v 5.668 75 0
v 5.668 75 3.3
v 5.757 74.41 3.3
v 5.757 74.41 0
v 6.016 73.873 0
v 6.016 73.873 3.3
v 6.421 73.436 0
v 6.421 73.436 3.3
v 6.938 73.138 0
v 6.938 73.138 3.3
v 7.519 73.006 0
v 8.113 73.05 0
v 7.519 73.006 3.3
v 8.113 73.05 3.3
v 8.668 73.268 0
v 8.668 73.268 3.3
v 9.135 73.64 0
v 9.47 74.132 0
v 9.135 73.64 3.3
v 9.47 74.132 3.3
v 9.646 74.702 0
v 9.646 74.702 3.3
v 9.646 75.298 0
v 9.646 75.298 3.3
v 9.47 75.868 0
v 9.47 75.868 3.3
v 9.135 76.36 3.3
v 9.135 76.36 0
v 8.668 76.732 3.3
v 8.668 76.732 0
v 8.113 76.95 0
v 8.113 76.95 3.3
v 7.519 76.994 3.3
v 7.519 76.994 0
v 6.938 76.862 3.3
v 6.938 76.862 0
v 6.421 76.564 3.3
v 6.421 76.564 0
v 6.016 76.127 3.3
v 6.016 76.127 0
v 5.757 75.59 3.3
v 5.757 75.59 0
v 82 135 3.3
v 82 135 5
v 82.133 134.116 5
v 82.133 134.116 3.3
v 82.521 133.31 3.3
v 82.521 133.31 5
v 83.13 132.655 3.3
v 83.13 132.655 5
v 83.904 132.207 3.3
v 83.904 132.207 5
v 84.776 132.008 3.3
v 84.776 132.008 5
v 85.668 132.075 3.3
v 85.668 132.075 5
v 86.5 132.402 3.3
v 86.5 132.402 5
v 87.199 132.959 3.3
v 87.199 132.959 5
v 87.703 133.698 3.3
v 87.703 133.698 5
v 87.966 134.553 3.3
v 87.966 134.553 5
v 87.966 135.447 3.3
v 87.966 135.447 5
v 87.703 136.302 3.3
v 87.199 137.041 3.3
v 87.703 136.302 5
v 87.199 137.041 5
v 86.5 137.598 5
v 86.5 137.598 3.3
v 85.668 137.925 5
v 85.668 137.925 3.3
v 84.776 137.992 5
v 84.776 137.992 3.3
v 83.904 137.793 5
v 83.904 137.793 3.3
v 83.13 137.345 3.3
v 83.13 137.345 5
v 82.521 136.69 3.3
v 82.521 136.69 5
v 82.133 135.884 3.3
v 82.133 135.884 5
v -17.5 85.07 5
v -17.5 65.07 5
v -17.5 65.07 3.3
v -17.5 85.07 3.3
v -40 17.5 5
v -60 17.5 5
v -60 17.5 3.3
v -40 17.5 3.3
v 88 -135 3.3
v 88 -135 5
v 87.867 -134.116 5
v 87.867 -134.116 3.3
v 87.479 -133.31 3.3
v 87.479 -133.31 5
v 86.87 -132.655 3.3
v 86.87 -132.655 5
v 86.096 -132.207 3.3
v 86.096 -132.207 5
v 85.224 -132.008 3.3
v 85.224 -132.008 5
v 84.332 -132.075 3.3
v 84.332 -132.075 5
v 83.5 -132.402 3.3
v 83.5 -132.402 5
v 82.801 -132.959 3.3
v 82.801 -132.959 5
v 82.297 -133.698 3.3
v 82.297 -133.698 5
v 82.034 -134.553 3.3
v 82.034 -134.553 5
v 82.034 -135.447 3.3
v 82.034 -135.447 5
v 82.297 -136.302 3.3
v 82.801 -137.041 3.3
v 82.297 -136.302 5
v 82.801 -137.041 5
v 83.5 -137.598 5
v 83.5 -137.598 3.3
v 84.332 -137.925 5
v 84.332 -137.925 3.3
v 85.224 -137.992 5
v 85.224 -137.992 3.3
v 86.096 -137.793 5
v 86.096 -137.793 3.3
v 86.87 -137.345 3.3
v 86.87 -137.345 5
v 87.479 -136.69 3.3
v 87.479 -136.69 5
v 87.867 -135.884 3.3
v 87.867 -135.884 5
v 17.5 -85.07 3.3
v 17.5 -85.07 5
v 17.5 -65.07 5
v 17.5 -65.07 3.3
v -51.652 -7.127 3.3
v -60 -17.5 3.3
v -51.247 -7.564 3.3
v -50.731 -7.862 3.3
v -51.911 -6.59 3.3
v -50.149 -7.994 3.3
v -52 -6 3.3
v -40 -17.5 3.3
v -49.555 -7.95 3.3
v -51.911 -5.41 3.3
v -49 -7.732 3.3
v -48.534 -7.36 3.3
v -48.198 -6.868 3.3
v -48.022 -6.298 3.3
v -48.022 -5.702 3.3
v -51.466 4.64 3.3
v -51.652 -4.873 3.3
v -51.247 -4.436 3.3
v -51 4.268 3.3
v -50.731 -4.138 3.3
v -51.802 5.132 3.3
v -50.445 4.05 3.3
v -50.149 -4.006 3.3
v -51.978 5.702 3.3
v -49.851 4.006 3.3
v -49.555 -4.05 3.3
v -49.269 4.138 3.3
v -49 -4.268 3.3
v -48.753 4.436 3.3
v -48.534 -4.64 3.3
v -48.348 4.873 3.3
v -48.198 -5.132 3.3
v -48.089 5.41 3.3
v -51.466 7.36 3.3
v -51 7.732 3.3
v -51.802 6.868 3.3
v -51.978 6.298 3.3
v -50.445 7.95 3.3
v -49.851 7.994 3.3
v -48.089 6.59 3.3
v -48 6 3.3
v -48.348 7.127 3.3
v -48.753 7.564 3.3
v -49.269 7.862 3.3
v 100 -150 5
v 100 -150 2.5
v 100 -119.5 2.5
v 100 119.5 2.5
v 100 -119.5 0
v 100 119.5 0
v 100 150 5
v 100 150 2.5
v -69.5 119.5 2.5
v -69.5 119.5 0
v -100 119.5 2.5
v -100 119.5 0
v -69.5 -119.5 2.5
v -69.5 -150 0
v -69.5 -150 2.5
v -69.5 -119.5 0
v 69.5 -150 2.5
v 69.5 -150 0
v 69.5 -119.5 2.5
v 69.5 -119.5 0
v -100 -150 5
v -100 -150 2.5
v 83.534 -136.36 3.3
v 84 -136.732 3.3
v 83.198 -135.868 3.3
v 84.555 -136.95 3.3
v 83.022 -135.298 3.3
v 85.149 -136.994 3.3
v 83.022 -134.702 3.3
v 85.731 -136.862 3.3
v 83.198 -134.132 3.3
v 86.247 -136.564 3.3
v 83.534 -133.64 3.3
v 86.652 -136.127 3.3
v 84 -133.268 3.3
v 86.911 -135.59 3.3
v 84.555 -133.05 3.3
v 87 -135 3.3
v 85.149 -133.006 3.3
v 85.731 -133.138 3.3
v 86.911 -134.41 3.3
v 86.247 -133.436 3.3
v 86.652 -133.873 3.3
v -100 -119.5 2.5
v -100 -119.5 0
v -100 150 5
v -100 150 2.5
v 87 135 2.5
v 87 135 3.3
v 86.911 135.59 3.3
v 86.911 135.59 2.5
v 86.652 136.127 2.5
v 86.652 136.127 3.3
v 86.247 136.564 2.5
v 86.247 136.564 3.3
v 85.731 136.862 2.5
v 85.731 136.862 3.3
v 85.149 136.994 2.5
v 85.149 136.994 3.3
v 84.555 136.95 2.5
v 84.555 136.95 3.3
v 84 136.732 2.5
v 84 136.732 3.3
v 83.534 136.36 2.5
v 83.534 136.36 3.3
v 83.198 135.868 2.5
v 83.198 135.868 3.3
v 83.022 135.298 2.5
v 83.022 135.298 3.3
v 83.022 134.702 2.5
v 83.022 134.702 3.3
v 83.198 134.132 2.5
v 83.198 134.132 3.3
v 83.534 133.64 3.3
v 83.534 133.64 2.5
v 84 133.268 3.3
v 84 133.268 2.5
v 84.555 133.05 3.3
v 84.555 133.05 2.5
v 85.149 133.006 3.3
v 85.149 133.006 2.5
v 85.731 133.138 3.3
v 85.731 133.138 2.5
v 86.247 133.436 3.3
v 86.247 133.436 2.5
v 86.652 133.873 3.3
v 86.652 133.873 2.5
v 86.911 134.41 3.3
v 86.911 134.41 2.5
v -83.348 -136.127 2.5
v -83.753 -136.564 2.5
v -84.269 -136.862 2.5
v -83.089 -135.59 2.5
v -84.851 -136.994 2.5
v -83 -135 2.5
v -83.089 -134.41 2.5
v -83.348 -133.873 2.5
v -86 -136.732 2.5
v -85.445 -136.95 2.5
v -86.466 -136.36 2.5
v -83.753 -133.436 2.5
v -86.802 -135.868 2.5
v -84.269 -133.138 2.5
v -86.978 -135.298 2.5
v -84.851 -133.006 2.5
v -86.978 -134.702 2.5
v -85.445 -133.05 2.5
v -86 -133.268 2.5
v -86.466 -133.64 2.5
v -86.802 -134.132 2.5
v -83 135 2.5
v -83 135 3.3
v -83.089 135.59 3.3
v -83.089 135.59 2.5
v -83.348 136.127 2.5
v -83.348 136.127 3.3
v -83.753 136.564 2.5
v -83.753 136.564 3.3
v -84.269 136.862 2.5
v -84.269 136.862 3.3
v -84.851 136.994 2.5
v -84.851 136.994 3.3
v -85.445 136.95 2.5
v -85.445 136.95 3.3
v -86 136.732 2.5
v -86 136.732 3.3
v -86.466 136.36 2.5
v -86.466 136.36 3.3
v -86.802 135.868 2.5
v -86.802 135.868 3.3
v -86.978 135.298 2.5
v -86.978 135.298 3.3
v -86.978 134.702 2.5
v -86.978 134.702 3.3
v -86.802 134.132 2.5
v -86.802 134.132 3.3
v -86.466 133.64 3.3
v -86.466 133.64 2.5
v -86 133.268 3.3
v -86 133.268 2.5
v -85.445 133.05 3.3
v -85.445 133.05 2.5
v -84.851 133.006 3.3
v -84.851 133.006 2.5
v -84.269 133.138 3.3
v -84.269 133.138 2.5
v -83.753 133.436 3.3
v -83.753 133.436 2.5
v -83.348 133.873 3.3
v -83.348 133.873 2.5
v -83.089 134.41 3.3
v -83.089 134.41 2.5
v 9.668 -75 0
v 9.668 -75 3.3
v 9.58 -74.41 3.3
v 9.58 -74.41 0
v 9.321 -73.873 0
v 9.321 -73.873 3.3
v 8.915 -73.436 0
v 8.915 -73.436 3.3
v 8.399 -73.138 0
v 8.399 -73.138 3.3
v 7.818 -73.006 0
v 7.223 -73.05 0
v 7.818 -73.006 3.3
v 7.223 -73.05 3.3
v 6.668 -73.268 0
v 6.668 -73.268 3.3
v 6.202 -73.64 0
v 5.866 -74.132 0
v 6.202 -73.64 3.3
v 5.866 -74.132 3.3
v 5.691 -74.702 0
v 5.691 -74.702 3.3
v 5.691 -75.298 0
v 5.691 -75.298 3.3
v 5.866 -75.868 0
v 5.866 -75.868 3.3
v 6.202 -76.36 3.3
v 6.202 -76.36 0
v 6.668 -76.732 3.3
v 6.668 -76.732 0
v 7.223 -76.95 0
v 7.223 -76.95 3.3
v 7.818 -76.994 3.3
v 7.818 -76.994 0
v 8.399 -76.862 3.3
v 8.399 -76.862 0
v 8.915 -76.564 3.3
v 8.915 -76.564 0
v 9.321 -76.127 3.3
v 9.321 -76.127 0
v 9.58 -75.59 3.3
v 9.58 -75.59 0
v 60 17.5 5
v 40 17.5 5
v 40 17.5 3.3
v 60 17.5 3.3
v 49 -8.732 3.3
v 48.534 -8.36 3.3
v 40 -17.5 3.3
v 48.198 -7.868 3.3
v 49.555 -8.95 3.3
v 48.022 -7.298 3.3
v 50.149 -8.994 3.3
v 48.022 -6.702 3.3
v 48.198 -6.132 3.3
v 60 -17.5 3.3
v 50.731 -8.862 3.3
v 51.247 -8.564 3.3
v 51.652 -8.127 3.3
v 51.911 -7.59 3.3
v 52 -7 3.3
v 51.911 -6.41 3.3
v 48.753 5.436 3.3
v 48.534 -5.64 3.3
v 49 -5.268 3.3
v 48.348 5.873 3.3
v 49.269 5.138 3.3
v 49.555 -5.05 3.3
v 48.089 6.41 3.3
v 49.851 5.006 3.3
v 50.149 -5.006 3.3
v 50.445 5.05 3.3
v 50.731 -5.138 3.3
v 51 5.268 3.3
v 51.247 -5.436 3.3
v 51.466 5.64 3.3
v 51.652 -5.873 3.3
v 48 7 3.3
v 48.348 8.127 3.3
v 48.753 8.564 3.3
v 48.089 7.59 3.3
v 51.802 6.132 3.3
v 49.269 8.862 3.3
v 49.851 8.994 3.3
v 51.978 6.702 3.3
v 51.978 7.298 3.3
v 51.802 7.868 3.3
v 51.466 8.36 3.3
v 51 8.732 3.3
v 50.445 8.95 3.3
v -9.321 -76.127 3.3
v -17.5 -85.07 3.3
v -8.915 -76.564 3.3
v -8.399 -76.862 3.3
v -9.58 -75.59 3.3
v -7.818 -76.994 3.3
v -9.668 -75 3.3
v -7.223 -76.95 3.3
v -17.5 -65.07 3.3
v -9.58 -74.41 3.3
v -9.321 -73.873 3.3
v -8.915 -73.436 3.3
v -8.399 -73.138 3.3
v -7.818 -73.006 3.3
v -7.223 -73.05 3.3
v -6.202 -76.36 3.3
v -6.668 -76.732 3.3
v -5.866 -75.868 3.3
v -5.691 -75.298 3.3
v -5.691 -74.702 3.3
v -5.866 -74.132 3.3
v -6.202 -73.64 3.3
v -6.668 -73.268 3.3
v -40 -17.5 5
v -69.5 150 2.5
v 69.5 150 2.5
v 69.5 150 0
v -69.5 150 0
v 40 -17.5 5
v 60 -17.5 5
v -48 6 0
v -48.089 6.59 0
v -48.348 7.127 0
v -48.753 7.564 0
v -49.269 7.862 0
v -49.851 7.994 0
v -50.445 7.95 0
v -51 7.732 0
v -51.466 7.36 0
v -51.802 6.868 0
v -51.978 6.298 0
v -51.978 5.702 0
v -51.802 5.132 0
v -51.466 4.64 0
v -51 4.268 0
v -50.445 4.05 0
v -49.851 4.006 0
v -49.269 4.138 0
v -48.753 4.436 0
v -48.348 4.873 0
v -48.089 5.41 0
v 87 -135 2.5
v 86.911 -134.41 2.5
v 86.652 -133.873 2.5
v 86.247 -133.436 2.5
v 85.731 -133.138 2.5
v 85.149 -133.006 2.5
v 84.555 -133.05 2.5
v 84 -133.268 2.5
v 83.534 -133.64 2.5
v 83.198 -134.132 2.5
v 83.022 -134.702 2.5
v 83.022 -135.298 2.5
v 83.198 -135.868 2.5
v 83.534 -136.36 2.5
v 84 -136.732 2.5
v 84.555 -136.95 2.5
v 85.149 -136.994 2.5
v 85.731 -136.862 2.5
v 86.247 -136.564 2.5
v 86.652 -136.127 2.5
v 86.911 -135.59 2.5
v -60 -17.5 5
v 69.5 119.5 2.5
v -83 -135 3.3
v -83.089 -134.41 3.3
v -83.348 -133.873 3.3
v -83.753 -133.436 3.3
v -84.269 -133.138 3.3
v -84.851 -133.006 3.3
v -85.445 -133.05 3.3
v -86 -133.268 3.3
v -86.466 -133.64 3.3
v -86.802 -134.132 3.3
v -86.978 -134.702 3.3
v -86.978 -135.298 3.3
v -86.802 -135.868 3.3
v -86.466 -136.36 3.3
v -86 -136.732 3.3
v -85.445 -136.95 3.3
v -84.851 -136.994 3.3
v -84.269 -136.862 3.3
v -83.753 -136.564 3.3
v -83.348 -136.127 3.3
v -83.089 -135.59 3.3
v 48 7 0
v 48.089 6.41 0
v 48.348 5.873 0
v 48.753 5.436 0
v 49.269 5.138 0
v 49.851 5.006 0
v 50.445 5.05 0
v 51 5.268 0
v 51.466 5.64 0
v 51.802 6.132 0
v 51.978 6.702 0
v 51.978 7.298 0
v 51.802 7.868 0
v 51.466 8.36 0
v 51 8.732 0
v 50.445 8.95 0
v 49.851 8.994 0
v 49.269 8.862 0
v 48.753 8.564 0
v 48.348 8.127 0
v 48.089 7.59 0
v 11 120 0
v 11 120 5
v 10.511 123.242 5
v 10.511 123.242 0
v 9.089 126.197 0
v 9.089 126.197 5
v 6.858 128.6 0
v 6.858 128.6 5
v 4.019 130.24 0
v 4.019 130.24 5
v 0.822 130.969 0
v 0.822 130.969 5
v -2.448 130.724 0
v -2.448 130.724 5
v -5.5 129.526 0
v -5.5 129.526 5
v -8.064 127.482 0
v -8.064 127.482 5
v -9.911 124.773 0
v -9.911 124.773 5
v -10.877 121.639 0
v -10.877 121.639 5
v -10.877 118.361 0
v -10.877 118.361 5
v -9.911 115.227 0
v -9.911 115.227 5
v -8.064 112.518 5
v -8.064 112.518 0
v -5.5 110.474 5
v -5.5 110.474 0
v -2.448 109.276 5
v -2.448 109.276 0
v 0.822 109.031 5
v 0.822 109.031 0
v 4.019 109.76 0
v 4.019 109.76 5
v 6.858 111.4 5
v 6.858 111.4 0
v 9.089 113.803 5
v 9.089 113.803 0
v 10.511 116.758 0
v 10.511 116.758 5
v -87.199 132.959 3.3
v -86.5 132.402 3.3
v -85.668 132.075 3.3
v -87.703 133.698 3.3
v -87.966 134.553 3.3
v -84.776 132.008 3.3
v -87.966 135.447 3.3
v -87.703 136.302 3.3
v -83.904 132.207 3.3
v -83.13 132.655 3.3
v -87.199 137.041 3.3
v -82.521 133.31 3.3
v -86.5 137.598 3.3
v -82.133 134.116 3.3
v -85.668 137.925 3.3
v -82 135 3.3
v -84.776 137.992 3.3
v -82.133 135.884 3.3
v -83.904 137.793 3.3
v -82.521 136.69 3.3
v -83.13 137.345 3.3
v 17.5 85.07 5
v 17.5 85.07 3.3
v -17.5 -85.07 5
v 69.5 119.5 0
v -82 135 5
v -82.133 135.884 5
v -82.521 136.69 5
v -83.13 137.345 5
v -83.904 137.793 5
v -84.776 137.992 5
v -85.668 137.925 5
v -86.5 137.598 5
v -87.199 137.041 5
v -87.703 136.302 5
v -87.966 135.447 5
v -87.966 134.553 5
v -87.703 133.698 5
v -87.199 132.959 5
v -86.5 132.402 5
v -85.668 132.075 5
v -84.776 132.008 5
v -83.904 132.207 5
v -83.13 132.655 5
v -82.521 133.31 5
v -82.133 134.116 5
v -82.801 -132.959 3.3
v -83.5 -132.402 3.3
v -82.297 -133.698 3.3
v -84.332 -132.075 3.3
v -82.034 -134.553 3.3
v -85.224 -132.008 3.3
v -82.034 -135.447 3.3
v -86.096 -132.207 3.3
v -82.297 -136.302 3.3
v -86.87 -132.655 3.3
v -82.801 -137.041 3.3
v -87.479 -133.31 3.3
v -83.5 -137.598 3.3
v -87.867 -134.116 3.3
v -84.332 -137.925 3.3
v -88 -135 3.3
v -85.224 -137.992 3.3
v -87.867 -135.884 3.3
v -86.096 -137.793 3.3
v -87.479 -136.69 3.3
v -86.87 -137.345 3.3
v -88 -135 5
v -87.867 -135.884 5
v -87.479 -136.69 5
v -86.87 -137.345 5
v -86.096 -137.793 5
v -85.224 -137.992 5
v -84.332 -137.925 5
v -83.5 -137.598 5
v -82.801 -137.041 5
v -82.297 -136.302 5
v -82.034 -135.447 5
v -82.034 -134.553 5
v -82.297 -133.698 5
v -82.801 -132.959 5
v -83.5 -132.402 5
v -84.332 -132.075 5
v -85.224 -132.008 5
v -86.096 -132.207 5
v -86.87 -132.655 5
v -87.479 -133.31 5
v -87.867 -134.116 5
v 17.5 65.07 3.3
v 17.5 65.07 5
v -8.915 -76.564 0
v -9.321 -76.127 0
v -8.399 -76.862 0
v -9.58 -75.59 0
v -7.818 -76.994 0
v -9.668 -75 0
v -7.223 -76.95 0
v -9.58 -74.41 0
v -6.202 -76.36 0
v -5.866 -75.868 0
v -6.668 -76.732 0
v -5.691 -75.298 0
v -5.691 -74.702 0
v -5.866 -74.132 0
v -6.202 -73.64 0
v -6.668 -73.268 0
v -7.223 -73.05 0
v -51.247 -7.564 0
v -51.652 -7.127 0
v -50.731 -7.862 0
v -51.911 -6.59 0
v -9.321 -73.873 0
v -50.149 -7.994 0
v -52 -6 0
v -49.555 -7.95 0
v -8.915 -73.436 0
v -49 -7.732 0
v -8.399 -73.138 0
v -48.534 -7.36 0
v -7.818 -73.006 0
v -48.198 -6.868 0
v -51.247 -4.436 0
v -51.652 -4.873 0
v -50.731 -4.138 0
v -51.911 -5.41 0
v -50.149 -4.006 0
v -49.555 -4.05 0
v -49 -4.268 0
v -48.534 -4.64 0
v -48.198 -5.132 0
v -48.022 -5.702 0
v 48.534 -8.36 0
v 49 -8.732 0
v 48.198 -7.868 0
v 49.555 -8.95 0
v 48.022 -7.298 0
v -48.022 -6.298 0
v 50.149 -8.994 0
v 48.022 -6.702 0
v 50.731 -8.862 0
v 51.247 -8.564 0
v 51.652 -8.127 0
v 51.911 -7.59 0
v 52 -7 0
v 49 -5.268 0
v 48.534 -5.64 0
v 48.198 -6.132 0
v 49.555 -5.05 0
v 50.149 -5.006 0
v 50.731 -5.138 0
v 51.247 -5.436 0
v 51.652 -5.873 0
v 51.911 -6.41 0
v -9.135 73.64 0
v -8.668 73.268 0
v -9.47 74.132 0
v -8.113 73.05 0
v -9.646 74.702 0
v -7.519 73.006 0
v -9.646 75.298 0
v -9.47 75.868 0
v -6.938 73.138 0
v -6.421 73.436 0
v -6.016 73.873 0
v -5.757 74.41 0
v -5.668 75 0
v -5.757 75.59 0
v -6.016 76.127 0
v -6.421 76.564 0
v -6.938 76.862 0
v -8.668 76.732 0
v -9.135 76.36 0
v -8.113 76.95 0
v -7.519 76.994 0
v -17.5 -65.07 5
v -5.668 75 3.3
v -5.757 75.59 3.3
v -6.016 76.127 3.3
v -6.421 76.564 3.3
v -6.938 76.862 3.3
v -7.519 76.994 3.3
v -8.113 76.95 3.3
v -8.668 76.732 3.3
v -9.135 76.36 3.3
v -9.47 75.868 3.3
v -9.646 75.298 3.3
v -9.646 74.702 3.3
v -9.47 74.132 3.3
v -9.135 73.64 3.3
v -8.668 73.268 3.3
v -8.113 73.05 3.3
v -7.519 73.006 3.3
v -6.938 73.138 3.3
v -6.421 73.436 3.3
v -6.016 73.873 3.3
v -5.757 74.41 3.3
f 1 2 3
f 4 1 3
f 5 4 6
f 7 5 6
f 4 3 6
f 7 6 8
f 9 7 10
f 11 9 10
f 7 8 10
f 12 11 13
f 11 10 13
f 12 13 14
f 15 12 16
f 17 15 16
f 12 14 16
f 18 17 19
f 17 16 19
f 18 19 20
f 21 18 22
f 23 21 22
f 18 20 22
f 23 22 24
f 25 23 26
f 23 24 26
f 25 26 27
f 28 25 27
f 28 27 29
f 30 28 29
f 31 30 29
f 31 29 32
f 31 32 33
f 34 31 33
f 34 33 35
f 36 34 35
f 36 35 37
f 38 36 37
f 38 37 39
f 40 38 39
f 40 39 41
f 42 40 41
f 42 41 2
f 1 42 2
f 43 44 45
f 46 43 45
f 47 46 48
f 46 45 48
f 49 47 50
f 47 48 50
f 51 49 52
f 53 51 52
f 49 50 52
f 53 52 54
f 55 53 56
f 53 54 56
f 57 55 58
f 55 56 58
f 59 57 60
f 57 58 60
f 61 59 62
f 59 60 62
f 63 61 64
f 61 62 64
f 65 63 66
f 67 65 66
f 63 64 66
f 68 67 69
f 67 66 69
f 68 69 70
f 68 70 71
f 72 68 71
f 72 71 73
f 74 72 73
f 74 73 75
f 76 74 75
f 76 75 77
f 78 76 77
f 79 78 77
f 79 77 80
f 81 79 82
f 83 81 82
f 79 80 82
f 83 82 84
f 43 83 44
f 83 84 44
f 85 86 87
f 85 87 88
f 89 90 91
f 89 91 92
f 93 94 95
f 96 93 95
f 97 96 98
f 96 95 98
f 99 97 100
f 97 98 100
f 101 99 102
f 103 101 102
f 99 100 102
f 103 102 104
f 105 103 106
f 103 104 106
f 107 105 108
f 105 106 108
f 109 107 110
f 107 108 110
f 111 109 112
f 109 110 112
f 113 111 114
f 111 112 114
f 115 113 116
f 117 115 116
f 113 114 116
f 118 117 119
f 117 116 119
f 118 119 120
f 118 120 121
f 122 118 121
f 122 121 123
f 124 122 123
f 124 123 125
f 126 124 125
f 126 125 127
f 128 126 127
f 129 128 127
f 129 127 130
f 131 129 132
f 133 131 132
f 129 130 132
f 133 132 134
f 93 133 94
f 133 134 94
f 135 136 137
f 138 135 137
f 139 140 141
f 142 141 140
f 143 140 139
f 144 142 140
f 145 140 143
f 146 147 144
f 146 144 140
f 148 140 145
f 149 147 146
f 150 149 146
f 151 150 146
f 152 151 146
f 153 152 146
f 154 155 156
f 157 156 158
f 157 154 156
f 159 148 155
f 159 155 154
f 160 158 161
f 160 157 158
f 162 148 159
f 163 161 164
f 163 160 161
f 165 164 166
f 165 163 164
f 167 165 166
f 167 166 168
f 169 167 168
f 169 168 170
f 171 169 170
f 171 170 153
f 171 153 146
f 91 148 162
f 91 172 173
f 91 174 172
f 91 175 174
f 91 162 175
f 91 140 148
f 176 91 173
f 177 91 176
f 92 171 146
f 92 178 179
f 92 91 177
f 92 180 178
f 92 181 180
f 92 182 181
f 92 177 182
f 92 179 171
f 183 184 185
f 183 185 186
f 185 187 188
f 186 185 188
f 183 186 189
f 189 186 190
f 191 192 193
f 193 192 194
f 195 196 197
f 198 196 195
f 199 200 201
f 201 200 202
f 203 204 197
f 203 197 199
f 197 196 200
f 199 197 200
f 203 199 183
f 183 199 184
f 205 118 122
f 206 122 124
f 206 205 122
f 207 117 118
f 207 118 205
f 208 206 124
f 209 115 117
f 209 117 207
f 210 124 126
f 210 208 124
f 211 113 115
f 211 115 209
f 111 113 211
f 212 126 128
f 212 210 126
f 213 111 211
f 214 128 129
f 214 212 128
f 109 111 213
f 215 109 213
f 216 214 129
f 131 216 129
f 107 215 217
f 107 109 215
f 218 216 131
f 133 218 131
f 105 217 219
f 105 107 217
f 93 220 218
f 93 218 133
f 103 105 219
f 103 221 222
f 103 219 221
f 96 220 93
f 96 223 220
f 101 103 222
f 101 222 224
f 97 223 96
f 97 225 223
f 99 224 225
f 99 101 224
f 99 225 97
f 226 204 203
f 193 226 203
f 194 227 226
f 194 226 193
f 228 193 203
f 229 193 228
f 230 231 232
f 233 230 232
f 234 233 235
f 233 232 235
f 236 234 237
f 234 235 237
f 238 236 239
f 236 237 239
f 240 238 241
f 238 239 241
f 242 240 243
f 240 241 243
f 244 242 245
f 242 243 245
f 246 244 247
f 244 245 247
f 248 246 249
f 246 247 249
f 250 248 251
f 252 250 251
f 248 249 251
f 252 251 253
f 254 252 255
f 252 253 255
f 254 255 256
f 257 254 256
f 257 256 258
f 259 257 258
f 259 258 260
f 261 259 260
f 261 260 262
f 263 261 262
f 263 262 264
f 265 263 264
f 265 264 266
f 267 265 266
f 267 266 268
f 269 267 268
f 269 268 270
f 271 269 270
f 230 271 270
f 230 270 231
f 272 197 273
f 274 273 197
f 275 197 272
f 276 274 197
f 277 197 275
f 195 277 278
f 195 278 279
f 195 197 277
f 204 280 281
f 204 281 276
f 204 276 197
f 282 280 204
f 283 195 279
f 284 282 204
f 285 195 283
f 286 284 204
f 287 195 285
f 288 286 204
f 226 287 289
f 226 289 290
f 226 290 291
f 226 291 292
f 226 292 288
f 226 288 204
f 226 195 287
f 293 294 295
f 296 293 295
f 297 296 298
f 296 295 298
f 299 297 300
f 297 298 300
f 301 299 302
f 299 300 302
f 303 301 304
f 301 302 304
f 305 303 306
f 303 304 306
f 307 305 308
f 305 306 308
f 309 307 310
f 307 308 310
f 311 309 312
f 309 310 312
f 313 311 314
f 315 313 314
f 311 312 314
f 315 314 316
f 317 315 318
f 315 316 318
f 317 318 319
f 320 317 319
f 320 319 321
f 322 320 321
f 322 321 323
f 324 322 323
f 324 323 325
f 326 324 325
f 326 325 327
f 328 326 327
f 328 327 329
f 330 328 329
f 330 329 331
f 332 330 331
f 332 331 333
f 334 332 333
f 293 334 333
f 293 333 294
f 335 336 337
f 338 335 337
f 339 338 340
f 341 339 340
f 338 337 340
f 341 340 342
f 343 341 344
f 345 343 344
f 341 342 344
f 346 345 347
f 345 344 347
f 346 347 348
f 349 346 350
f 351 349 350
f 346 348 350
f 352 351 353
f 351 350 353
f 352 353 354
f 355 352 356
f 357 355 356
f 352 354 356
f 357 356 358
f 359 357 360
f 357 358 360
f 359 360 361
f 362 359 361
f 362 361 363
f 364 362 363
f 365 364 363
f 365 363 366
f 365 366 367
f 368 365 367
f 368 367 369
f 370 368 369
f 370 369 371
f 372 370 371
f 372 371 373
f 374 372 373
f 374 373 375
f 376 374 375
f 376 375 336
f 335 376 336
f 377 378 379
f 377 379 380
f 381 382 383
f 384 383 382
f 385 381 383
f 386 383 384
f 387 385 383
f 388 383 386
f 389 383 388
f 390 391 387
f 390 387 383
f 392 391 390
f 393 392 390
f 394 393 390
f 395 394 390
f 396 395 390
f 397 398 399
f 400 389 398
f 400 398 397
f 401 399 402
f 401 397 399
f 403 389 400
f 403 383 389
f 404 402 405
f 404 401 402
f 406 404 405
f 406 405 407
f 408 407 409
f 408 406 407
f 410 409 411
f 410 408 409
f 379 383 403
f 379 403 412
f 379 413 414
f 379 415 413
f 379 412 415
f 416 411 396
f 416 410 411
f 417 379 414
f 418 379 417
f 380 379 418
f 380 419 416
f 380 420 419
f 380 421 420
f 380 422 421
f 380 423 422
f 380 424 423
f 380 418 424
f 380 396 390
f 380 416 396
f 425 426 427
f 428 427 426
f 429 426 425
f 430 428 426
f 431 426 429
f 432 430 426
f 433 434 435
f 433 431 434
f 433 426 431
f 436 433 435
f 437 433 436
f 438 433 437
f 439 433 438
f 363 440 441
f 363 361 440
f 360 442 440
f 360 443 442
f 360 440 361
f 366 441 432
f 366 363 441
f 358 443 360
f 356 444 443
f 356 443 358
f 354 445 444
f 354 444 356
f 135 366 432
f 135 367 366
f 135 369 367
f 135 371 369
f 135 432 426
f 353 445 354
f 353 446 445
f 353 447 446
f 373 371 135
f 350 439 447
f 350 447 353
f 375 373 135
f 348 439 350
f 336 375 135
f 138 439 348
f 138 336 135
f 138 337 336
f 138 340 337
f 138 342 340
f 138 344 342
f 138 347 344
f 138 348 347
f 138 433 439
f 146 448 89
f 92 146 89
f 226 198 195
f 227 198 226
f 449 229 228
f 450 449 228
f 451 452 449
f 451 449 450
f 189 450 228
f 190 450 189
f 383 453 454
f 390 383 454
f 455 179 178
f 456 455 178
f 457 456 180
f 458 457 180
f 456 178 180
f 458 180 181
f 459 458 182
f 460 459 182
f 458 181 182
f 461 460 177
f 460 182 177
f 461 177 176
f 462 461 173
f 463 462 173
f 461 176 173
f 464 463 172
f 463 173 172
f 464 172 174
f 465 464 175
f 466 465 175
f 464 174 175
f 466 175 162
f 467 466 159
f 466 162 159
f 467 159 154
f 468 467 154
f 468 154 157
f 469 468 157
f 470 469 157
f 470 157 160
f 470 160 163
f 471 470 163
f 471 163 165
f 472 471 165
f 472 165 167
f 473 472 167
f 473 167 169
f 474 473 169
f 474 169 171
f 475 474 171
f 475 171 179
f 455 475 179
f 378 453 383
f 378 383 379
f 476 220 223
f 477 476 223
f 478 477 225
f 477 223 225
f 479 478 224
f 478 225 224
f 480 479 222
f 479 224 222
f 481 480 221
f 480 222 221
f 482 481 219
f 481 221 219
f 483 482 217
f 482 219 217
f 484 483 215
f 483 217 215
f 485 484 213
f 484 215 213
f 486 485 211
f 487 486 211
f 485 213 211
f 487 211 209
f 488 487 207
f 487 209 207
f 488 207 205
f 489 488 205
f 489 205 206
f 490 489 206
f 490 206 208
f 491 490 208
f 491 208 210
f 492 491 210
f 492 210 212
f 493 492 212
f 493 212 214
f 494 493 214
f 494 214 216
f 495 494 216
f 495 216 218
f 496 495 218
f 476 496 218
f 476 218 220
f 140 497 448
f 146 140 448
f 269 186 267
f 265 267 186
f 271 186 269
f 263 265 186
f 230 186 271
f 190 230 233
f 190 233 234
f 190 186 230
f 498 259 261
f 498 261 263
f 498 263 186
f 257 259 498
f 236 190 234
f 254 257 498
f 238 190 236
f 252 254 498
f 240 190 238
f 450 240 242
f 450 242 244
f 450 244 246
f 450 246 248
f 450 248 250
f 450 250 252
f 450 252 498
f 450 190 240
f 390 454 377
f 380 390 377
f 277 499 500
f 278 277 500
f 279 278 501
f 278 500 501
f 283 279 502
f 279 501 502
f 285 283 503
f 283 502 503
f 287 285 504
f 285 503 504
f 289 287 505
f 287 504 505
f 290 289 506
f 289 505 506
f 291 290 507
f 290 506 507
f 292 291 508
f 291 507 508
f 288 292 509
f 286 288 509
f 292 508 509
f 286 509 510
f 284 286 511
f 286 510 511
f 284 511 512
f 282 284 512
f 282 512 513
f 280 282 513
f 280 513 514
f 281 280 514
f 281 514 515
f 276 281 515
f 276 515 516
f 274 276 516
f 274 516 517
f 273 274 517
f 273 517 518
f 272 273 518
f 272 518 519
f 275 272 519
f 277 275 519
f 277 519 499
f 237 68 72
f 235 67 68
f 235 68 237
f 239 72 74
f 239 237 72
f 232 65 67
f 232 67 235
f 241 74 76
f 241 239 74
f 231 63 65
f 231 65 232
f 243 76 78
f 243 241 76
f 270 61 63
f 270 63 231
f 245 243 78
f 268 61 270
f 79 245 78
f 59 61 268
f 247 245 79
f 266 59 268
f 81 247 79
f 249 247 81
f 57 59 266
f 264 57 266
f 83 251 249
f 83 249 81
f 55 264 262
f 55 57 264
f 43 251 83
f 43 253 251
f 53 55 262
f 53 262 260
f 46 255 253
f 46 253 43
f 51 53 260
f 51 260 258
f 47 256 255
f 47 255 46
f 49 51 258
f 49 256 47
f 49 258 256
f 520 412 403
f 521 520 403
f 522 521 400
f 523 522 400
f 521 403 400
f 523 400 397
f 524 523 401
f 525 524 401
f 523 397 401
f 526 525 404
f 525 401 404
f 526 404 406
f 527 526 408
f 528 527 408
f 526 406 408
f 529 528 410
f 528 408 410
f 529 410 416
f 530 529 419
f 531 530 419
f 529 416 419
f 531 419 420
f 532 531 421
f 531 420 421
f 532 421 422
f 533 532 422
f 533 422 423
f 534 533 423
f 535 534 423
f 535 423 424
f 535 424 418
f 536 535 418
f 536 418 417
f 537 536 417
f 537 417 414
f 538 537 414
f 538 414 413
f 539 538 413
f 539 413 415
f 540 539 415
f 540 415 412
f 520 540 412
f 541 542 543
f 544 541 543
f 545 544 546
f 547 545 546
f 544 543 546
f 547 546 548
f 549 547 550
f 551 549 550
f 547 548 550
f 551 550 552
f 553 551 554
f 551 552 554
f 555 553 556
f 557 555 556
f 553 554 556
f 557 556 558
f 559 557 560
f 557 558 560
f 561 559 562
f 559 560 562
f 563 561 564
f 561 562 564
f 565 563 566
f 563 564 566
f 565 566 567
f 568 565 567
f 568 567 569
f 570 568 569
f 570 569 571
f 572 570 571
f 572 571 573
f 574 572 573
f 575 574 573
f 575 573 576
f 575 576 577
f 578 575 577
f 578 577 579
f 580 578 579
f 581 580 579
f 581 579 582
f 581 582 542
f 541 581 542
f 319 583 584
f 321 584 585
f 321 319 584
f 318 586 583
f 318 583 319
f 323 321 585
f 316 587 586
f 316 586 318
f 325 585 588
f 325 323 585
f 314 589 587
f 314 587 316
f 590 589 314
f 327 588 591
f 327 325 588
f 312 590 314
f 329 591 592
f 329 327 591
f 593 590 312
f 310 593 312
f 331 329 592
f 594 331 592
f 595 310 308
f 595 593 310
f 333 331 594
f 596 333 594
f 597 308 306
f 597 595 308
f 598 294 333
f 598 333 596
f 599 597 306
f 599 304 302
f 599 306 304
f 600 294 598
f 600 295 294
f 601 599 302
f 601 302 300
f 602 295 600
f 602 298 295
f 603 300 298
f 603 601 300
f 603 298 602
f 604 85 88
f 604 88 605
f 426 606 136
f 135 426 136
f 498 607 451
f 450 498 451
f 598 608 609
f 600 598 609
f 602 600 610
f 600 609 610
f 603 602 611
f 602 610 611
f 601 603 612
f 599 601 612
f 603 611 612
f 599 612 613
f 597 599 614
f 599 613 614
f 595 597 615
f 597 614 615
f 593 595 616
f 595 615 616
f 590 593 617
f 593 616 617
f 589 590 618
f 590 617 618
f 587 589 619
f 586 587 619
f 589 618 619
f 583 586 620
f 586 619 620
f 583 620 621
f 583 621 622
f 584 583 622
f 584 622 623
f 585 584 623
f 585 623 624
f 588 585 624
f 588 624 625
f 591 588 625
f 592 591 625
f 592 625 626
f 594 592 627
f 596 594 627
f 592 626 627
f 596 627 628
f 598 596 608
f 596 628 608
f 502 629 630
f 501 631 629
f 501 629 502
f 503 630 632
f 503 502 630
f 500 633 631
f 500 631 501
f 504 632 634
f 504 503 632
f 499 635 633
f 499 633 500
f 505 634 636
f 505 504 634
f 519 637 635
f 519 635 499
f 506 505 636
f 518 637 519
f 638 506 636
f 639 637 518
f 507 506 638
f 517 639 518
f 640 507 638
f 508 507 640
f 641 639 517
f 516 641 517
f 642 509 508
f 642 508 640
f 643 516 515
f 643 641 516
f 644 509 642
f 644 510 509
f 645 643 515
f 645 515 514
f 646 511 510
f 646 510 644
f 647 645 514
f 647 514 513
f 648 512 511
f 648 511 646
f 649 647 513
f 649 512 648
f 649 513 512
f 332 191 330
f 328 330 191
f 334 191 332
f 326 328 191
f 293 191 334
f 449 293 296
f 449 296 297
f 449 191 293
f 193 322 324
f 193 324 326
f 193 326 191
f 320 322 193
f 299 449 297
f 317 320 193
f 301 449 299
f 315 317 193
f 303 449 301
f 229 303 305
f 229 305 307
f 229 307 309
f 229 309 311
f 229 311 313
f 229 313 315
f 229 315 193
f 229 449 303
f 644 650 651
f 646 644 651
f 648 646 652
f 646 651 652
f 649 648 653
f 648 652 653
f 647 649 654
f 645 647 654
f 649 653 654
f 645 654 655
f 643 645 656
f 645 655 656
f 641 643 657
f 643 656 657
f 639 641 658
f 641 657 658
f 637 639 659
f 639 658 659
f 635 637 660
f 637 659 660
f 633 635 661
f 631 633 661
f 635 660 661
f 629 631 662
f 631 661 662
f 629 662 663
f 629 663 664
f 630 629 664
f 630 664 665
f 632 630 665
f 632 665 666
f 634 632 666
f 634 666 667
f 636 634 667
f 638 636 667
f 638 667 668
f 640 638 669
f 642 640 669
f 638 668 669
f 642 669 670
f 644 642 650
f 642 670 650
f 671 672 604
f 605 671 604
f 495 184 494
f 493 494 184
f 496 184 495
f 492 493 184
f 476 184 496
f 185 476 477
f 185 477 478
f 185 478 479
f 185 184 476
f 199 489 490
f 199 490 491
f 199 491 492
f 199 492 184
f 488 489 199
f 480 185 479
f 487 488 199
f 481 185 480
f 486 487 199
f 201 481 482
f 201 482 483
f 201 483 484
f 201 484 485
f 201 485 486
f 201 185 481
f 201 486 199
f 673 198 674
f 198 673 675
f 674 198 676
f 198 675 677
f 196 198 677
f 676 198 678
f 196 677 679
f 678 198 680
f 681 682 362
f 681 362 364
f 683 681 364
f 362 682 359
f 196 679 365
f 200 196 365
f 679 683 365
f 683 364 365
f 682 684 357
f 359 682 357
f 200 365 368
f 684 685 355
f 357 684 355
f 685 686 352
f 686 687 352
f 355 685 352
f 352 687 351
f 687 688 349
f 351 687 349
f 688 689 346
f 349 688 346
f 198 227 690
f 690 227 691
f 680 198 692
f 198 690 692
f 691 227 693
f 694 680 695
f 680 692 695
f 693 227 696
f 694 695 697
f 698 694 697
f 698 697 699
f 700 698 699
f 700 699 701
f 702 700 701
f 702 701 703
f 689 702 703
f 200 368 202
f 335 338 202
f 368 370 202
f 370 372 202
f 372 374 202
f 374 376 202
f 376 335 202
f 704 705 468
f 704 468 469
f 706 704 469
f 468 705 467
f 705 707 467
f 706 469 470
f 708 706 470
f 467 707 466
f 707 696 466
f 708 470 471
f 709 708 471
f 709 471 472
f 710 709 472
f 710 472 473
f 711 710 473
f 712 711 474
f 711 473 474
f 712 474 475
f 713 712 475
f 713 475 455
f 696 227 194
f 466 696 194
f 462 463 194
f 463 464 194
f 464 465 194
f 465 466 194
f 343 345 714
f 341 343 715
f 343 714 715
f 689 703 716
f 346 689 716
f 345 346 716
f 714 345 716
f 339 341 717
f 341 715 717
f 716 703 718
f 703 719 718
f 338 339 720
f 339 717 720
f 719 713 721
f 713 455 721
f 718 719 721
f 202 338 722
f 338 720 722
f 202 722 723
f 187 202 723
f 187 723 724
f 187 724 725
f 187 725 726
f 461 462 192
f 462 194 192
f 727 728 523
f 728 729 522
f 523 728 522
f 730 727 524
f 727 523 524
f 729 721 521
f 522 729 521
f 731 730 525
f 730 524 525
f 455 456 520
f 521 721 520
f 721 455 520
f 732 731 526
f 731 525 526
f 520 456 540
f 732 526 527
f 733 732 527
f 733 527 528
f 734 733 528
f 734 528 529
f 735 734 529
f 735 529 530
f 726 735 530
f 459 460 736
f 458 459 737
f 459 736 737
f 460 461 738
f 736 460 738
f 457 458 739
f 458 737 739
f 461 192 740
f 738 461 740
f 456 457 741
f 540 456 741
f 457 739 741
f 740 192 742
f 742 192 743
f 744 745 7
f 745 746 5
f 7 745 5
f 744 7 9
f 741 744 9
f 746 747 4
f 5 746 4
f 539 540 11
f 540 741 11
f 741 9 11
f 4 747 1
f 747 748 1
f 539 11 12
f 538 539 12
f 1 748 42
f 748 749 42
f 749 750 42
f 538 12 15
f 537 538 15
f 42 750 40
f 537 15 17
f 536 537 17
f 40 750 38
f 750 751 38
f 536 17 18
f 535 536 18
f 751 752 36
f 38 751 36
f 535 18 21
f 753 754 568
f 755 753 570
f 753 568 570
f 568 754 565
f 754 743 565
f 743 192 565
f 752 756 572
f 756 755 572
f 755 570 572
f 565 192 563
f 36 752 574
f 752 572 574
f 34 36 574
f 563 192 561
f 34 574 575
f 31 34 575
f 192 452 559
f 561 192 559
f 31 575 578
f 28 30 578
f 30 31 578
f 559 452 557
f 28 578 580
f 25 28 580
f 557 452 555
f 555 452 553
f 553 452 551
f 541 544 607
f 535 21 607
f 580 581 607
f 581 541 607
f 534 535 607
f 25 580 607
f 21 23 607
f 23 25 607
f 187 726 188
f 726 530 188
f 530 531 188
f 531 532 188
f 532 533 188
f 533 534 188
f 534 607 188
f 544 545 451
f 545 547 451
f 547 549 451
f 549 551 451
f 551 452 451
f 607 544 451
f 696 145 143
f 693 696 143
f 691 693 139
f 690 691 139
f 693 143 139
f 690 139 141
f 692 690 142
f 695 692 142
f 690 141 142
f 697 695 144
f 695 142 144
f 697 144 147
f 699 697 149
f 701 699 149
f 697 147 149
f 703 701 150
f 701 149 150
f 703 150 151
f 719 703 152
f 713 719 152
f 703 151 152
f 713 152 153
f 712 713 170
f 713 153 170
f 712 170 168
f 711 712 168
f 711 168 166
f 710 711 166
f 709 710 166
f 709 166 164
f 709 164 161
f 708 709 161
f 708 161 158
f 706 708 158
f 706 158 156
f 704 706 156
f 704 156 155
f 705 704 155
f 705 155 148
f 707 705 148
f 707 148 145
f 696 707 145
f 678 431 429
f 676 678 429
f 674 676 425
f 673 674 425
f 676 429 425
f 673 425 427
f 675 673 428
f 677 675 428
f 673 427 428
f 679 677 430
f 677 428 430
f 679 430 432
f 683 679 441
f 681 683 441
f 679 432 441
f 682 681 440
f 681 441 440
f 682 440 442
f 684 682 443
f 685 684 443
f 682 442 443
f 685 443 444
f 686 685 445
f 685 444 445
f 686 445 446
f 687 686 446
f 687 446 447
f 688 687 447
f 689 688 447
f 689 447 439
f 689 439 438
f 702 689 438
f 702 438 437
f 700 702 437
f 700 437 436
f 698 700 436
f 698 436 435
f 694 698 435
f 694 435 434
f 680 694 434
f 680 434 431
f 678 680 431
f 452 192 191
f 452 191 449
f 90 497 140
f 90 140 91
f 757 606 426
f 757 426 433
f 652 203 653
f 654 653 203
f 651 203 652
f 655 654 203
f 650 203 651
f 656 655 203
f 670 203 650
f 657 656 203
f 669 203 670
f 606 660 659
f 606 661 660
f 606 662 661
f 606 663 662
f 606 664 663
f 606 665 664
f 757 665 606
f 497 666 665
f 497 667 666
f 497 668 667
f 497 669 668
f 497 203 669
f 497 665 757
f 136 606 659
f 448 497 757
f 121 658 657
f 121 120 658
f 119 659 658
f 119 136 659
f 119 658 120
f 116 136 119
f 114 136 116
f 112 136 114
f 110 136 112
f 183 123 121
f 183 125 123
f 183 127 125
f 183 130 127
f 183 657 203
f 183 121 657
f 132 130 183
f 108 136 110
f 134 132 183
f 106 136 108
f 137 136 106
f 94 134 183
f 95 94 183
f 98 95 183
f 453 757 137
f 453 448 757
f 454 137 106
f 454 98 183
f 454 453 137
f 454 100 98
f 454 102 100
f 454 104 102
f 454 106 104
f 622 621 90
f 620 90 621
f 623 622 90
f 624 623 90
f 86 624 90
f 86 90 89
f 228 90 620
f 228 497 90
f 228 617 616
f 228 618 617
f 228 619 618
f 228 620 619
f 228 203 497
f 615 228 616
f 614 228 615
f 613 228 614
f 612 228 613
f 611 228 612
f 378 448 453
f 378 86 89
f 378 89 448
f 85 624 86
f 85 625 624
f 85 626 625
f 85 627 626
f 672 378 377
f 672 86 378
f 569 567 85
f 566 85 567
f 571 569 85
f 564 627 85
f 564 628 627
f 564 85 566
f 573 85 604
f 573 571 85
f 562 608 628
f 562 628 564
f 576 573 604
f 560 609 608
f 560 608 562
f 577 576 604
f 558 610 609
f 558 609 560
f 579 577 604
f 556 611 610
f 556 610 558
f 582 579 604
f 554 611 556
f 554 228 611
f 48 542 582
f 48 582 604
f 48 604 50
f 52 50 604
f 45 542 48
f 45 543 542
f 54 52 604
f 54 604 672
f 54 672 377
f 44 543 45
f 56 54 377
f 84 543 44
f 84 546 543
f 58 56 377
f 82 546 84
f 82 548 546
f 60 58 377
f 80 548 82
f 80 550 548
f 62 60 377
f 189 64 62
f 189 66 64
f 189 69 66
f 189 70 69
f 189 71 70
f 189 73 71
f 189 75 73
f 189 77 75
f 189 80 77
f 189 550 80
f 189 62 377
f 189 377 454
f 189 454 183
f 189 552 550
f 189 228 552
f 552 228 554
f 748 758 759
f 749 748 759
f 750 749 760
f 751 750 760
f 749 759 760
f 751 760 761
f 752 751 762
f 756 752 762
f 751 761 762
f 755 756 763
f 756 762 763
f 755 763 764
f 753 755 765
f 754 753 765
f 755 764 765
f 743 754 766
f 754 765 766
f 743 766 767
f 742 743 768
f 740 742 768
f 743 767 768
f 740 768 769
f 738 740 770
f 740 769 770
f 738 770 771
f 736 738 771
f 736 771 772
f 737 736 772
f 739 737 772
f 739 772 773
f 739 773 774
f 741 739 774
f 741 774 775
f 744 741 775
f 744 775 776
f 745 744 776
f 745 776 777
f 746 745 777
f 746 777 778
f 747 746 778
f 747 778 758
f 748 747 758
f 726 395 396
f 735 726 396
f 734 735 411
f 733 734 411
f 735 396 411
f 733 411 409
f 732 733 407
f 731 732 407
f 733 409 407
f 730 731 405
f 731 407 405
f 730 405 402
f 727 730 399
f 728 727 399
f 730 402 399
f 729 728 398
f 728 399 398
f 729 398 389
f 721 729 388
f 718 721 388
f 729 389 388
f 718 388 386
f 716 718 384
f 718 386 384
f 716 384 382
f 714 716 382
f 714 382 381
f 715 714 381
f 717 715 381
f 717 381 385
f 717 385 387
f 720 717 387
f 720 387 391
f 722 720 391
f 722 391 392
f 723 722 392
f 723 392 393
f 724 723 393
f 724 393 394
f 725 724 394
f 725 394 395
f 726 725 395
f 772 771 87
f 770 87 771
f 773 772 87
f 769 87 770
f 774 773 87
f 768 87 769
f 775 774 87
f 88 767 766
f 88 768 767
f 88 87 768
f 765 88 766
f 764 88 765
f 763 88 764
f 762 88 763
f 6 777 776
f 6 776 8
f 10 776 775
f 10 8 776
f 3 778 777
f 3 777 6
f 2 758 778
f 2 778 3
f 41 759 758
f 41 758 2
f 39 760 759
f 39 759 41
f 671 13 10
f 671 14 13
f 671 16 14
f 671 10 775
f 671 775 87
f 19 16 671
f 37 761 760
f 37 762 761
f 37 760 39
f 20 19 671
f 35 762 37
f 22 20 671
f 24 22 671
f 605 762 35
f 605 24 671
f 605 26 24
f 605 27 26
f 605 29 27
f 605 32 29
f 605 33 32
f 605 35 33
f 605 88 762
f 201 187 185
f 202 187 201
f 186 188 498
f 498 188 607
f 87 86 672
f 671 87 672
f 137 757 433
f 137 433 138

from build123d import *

# Parameters (mm, degrees)
CROQUIS1_W              = 200
CROQUIS1_H              = 300
SALIENTE_EXTRUIR1_DEPTH = 5
CROQUIS2_R              = 11
CORTAR_EXTRUIR1_DEPTH   = 15
CROQUIS3_R              = 2
AG_COLUMNA_DEPTH        = 15
CROQUIS4_R              = 2
CORTAR_EXTRUIR3_DEPTH   = 15
CROQUIS5_R              = 3
CROQUIS5_W              = 20
CROQUIS5_H              = 35
CROQUIS5_W_2            = 35
CROQUIS5_H_2            = 20
CORTAR_EXTRUIR4_DEPTH   = 1.7
CROQUIS6_W              = 30.5
CROQUIS6_H              = 30.5
CORTAR_EXTRUIR5_DEPTH   = 2.5


with BuildPart() as part:
    # Croquis1 → Saliente-Extruir1 (new body)
    with BuildSketch(Plane.XY):
        Rectangle(CROQUIS1_W, CROQUIS1_H)
    extrude(amount=SALIENTE_EXTRUIR1_DEPTH)

    # Croquis2 → Cortar-Extruir1 (cut)
    with BuildSketch(Plane.XY.offset(5)):
        with Locations((0, 120)):
            Circle(CROQUIS2_R)
    extrude(amount=-CORTAR_EXTRUIR1_DEPTH, mode=Mode.SUBTRACT)

    # Croquis3 → Ag. Columna (cut)
    with BuildSketch(Plane.XY.offset(5)):
        with Locations((85, 135)):
            Circle(CROQUIS3_R)
        with Locations((-85, 135)):
            Circle(CROQUIS3_R)
        with Locations((-85, -135)):
            Circle(CROQUIS3_R)
        with Locations((85, -135)):
            Circle(CROQUIS3_R)
    extrude(amount=-AG_COLUMNA_DEPTH, mode=Mode.SUBTRACT)

    # Croquis4 → Cortar-Extruir3 (cut)
    with BuildSketch(Plane.XY.offset(5)):
        with Locations((-50, 6)):
            Circle(CROQUIS4_R)
        with Locations(Location((-50, -6, 0), (0, 0, 180))):
            Circle(CROQUIS4_R)
        with Locations((50, -7)):
            Circle(CROQUIS4_R)
        with Locations(Location((50, 7, 0), (0, 0, 180))):
            Circle(CROQUIS4_R)
        with Locations((-7.668433443, 75)):
            Circle(CROQUIS4_R)
        with Locations(Location((7.668433443, 75, 0), (0, 0, 180))):
            Circle(CROQUIS4_R)
        with Locations(Location((-7.668433443, -75, 0), (0, 0, 180))):
            Circle(CROQUIS4_R)
        with Locations((7.668433443, -75)):
            Circle(CROQUIS4_R)
    extrude(amount=-CORTAR_EXTRUIR3_DEPTH, mode=Mode.SUBTRACT)

    # Croquis5 → Cortar-Extruir4 (cut)
    with BuildSketch(Plane.XY.offset(5)):
        with Locations((-85, 135)):
            Circle(CROQUIS5_R)
        with Locations(Location((85, 135, 0), (0, 0, 180))):
            Circle(CROQUIS5_R)
        with Locations(Location((-85, -135, 0), (0, 0, 180))):
            Circle(CROQUIS5_R)
        with Locations((85, -135)):
            Circle(CROQUIS5_R)
        with Locations((-50, 0)):
            Rectangle(CROQUIS5_W, CROQUIS5_H)
        with Locations((0, -75.070372891)):
            Rectangle(CROQUIS5_W_2, CROQUIS5_H_2)
        with Locations((0, 75.070372891)):
            Rectangle(CROQUIS5_W_2, CROQUIS5_H_2)
        with Locations((50, 0)):
            Rectangle(CROQUIS5_W, CROQUIS5_H)
    extrude(amount=-CORTAR_EXTRUIR4_DEPTH, mode=Mode.SUBTRACT)

    # Croquis6 → Cortar-Extruir5 (cut)
    with BuildSketch(Plane(origin=(0, 0, 0), x_dir=(-1, 0, 0), z_dir=(0, 0, -1))):
        with Locations((-84.75, 134.75)):
            Rectangle(CROQUIS6_W, CROQUIS6_H)
        with Locations((84.75, 134.75)):
            Rectangle(CROQUIS6_W, CROQUIS6_H)
        with Locations((84.75, -134.75)):
            Rectangle(CROQUIS6_W, CROQUIS6_H)
        with Locations((-84.75, -134.75)):
            Rectangle(CROQUIS6_W, CROQUIS6_H)
    extrude(amount=-CORTAR_EXTRUIR5_DEPTH, mode=Mode.SUBTRACT)


solid = part.part
